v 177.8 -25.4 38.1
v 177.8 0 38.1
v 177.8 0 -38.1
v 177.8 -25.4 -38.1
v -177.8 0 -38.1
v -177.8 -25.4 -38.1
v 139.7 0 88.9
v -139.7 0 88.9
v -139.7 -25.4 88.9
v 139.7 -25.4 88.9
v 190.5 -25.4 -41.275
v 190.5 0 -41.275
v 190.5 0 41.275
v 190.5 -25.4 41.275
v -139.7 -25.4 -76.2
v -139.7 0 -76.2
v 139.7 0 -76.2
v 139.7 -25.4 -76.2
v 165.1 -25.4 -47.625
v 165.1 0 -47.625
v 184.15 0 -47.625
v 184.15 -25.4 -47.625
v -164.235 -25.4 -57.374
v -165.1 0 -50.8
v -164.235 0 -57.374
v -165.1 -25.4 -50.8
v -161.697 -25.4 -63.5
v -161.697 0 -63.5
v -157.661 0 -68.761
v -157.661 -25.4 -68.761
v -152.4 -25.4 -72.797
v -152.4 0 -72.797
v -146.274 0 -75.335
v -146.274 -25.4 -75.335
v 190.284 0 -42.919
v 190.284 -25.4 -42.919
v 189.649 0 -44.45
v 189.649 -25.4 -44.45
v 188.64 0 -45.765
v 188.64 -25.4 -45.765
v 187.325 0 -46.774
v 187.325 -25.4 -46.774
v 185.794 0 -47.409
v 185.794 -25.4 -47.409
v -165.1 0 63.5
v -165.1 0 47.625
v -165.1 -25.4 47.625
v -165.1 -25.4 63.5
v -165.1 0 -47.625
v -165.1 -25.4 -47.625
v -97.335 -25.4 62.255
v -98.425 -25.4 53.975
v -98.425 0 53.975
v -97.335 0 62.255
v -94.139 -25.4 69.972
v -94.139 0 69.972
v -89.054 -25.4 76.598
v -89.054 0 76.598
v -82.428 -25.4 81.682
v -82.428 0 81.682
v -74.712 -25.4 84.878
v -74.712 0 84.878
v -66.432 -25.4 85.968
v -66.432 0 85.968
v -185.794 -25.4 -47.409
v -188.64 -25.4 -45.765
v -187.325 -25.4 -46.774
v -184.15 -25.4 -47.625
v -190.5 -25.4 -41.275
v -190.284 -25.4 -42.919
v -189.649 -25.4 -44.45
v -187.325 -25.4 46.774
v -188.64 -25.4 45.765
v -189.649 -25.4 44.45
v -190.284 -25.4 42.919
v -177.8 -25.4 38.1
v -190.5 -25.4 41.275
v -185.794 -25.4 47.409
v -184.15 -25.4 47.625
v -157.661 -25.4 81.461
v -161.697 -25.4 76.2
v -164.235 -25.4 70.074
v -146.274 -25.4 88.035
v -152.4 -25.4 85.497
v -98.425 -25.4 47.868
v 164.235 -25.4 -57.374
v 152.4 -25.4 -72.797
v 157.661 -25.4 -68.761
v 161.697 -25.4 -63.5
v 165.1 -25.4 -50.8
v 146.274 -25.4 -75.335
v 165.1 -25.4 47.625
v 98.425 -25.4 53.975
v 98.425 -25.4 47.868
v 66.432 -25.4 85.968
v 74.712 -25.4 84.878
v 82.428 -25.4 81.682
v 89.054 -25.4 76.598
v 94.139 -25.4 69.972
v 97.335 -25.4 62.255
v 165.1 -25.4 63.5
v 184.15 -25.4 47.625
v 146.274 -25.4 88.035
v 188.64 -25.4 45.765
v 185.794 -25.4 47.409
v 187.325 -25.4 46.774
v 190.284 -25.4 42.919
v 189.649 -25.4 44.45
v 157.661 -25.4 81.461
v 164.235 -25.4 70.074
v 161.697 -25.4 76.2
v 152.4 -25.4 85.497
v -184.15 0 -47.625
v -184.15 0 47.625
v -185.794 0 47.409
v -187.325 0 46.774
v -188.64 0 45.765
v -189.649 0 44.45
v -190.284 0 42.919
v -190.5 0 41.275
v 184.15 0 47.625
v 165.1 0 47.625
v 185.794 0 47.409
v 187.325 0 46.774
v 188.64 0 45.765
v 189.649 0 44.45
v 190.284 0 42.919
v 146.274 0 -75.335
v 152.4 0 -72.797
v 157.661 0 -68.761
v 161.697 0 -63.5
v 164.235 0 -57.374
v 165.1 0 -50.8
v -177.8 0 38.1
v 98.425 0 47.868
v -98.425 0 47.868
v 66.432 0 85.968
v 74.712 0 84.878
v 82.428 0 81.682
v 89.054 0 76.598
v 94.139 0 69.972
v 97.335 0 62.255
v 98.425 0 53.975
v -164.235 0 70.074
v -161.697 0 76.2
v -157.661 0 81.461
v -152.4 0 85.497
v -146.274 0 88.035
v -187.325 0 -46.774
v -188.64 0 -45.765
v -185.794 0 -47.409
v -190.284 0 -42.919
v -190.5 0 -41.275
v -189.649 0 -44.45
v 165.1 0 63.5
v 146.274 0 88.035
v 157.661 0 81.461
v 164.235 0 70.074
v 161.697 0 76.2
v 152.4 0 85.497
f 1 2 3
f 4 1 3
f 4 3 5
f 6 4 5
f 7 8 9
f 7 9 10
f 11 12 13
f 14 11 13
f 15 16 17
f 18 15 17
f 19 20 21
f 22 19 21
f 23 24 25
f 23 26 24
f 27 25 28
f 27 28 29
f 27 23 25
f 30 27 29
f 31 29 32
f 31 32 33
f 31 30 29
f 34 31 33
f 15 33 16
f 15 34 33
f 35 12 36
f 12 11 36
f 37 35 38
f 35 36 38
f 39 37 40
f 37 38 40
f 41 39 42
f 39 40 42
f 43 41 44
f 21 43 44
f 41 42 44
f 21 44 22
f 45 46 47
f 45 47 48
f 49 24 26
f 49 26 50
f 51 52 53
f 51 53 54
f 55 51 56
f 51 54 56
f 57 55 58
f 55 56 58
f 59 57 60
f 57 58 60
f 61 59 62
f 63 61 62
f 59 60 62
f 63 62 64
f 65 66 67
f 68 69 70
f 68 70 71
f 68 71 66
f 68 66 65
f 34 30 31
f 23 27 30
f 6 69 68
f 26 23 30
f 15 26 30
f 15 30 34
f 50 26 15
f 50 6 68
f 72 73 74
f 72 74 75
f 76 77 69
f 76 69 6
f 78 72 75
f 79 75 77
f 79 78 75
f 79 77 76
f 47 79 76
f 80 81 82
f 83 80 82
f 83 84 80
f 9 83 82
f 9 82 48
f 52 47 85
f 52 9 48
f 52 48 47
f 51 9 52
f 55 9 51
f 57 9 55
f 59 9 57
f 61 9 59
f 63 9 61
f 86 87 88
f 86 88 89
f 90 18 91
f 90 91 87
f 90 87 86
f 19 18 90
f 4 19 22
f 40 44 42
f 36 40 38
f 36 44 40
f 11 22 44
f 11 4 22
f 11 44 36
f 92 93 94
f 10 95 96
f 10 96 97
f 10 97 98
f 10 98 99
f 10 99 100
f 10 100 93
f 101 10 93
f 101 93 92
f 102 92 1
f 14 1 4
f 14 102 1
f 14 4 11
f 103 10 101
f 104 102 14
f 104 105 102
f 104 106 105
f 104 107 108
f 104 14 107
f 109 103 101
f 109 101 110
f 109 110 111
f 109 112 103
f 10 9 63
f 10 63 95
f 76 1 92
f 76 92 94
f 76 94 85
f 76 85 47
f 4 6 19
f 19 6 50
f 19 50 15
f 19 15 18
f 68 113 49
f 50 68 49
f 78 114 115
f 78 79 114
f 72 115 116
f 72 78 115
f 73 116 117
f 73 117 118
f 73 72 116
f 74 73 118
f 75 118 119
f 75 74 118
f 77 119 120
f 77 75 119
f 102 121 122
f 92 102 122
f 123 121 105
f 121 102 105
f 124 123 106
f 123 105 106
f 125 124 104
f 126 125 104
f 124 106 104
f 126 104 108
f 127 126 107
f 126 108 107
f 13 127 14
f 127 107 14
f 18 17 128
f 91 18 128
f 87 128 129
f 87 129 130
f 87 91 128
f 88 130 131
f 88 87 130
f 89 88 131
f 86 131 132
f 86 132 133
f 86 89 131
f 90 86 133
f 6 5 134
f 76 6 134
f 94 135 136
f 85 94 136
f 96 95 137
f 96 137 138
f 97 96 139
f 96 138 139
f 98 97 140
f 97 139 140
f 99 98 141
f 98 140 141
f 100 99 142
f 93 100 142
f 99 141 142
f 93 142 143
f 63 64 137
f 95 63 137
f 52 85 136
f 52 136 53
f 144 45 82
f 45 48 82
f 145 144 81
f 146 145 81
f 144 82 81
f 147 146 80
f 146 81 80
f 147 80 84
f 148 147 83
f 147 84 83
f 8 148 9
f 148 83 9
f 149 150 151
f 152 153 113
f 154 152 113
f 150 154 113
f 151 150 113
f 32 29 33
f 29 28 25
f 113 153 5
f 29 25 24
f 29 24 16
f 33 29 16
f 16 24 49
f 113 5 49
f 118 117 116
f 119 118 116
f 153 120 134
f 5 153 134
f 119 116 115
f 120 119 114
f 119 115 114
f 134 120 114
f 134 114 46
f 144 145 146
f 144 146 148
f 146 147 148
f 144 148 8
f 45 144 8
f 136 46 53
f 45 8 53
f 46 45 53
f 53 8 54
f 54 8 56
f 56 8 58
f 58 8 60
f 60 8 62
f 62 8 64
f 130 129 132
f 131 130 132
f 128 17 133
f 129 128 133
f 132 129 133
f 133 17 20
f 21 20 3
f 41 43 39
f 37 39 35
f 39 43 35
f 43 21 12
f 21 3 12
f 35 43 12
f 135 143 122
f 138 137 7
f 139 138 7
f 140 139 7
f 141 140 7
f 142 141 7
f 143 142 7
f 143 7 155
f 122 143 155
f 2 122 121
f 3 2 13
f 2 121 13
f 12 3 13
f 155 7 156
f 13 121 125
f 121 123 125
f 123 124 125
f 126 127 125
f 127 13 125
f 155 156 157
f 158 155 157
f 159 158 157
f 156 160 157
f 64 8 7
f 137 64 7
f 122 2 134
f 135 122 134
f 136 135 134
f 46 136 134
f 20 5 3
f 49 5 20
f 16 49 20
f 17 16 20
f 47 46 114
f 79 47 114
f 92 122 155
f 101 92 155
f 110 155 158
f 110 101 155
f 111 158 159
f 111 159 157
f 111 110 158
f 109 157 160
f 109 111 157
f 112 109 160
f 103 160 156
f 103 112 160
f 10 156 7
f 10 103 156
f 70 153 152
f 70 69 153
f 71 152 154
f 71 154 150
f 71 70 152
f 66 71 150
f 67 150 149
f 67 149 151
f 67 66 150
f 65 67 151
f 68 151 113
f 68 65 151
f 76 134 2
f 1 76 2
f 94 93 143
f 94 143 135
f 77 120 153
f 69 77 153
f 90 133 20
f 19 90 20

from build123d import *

# Parameters (mm, degrees)
F0_W     = 330.2
F0_H     = 41.275
F0_H_2   = 9.525
F0_H_3   = 28.575
F1_DEPTH = 25.4
F2_R     = 25.4
F3_R     = 6.35


with BuildPart() as f1:
    # F0 (on Front) → F1 (new body)
    with BuildSketch(Plane.XZ):
        with Locations((0, 68.2625)):
            Rectangle(F0_W, F0_H)
        Polygon((66.4316704035, 85.9683295965), (98.425, 85.9683295965), (98.425, 53.975), (98.425, 47.8683295965), (-98.425, 47.8683295965), (-98.425, 53.975), (-98.425, 85.9683295965), (-66.4316704035, 85.9683295965), align=None, mode=Mode.SUBTRACT)
        with BuildLine():
            ThreePointArc((-98.425, 53.975), (-89.0543707139, 76.5977003104), (-66.4316704035, 85.9683295965))
            Line((-66.4316704035, 85.9683295965), (-98.425, 85.9683295965))
            Line((-98.425, 85.9683295965), (-98.425, 53.975))
        make_face()
        with BuildLine():
            Line((98.425, 53.975), (98.425, 85.9683295965))
            Line((98.425, 85.9683295965), (66.4316704035, 85.9683295965))
            ThreePointArc((66.4316704035, 85.9683295965), (89.0543707139, 76.5977003104), (98.425, 53.975))
        make_face()
        Polygon((-190.5, -47.625), (-165.1, -47.625), (-165.1, -38.1), (-177.8, -38.1), (-177.8, 38.1), (-165.1, 38.1), (-165.1, 47.625), (-190.5, 47.625), align=None)
        with Locations((0, 42.8625)):
            Rectangle(F0_W, F0_H_2)
        Polygon((165.1, -47.625), (190.5, -47.625), (190.5, 47.625), (165.1, 47.625), (165.1, 38.1), (177.8, 38.1), (177.8, -38.1), (165.1, -38.1), align=None)
        with Locations((0, -42.8625)):
            Rectangle(F0_W, F0_H_2)
        with Locations((0, -61.9125)):
            Rectangle(F0_W, F0_H_3)
    extrude(amount=F1_DEPTH)

    # F2
    f2_edges = [f1.edges().sort_by_distance(p)[0] for p in [
        (-165.1, -12.7, 88.9),
        (165.1, -12.7, 88.9),
        (-165.1, -12.7, -76.2),
        (165.1, -12.7, -76.2),
    ]]
    fillet(f2_edges, radius=F2_R)

    # F3
    f3_edges = [f1.edges().sort_by_distance(p)[0] for p in [
        (-190.5, -12.7, 47.625),
        (-190.5, -12.7, -47.625),
        (190.5, -12.7, -47.625),
        (190.5, -12.7, 47.625),
    ]]
    fillet(f3_edges, radius=F3_R)


solid = f1.part
